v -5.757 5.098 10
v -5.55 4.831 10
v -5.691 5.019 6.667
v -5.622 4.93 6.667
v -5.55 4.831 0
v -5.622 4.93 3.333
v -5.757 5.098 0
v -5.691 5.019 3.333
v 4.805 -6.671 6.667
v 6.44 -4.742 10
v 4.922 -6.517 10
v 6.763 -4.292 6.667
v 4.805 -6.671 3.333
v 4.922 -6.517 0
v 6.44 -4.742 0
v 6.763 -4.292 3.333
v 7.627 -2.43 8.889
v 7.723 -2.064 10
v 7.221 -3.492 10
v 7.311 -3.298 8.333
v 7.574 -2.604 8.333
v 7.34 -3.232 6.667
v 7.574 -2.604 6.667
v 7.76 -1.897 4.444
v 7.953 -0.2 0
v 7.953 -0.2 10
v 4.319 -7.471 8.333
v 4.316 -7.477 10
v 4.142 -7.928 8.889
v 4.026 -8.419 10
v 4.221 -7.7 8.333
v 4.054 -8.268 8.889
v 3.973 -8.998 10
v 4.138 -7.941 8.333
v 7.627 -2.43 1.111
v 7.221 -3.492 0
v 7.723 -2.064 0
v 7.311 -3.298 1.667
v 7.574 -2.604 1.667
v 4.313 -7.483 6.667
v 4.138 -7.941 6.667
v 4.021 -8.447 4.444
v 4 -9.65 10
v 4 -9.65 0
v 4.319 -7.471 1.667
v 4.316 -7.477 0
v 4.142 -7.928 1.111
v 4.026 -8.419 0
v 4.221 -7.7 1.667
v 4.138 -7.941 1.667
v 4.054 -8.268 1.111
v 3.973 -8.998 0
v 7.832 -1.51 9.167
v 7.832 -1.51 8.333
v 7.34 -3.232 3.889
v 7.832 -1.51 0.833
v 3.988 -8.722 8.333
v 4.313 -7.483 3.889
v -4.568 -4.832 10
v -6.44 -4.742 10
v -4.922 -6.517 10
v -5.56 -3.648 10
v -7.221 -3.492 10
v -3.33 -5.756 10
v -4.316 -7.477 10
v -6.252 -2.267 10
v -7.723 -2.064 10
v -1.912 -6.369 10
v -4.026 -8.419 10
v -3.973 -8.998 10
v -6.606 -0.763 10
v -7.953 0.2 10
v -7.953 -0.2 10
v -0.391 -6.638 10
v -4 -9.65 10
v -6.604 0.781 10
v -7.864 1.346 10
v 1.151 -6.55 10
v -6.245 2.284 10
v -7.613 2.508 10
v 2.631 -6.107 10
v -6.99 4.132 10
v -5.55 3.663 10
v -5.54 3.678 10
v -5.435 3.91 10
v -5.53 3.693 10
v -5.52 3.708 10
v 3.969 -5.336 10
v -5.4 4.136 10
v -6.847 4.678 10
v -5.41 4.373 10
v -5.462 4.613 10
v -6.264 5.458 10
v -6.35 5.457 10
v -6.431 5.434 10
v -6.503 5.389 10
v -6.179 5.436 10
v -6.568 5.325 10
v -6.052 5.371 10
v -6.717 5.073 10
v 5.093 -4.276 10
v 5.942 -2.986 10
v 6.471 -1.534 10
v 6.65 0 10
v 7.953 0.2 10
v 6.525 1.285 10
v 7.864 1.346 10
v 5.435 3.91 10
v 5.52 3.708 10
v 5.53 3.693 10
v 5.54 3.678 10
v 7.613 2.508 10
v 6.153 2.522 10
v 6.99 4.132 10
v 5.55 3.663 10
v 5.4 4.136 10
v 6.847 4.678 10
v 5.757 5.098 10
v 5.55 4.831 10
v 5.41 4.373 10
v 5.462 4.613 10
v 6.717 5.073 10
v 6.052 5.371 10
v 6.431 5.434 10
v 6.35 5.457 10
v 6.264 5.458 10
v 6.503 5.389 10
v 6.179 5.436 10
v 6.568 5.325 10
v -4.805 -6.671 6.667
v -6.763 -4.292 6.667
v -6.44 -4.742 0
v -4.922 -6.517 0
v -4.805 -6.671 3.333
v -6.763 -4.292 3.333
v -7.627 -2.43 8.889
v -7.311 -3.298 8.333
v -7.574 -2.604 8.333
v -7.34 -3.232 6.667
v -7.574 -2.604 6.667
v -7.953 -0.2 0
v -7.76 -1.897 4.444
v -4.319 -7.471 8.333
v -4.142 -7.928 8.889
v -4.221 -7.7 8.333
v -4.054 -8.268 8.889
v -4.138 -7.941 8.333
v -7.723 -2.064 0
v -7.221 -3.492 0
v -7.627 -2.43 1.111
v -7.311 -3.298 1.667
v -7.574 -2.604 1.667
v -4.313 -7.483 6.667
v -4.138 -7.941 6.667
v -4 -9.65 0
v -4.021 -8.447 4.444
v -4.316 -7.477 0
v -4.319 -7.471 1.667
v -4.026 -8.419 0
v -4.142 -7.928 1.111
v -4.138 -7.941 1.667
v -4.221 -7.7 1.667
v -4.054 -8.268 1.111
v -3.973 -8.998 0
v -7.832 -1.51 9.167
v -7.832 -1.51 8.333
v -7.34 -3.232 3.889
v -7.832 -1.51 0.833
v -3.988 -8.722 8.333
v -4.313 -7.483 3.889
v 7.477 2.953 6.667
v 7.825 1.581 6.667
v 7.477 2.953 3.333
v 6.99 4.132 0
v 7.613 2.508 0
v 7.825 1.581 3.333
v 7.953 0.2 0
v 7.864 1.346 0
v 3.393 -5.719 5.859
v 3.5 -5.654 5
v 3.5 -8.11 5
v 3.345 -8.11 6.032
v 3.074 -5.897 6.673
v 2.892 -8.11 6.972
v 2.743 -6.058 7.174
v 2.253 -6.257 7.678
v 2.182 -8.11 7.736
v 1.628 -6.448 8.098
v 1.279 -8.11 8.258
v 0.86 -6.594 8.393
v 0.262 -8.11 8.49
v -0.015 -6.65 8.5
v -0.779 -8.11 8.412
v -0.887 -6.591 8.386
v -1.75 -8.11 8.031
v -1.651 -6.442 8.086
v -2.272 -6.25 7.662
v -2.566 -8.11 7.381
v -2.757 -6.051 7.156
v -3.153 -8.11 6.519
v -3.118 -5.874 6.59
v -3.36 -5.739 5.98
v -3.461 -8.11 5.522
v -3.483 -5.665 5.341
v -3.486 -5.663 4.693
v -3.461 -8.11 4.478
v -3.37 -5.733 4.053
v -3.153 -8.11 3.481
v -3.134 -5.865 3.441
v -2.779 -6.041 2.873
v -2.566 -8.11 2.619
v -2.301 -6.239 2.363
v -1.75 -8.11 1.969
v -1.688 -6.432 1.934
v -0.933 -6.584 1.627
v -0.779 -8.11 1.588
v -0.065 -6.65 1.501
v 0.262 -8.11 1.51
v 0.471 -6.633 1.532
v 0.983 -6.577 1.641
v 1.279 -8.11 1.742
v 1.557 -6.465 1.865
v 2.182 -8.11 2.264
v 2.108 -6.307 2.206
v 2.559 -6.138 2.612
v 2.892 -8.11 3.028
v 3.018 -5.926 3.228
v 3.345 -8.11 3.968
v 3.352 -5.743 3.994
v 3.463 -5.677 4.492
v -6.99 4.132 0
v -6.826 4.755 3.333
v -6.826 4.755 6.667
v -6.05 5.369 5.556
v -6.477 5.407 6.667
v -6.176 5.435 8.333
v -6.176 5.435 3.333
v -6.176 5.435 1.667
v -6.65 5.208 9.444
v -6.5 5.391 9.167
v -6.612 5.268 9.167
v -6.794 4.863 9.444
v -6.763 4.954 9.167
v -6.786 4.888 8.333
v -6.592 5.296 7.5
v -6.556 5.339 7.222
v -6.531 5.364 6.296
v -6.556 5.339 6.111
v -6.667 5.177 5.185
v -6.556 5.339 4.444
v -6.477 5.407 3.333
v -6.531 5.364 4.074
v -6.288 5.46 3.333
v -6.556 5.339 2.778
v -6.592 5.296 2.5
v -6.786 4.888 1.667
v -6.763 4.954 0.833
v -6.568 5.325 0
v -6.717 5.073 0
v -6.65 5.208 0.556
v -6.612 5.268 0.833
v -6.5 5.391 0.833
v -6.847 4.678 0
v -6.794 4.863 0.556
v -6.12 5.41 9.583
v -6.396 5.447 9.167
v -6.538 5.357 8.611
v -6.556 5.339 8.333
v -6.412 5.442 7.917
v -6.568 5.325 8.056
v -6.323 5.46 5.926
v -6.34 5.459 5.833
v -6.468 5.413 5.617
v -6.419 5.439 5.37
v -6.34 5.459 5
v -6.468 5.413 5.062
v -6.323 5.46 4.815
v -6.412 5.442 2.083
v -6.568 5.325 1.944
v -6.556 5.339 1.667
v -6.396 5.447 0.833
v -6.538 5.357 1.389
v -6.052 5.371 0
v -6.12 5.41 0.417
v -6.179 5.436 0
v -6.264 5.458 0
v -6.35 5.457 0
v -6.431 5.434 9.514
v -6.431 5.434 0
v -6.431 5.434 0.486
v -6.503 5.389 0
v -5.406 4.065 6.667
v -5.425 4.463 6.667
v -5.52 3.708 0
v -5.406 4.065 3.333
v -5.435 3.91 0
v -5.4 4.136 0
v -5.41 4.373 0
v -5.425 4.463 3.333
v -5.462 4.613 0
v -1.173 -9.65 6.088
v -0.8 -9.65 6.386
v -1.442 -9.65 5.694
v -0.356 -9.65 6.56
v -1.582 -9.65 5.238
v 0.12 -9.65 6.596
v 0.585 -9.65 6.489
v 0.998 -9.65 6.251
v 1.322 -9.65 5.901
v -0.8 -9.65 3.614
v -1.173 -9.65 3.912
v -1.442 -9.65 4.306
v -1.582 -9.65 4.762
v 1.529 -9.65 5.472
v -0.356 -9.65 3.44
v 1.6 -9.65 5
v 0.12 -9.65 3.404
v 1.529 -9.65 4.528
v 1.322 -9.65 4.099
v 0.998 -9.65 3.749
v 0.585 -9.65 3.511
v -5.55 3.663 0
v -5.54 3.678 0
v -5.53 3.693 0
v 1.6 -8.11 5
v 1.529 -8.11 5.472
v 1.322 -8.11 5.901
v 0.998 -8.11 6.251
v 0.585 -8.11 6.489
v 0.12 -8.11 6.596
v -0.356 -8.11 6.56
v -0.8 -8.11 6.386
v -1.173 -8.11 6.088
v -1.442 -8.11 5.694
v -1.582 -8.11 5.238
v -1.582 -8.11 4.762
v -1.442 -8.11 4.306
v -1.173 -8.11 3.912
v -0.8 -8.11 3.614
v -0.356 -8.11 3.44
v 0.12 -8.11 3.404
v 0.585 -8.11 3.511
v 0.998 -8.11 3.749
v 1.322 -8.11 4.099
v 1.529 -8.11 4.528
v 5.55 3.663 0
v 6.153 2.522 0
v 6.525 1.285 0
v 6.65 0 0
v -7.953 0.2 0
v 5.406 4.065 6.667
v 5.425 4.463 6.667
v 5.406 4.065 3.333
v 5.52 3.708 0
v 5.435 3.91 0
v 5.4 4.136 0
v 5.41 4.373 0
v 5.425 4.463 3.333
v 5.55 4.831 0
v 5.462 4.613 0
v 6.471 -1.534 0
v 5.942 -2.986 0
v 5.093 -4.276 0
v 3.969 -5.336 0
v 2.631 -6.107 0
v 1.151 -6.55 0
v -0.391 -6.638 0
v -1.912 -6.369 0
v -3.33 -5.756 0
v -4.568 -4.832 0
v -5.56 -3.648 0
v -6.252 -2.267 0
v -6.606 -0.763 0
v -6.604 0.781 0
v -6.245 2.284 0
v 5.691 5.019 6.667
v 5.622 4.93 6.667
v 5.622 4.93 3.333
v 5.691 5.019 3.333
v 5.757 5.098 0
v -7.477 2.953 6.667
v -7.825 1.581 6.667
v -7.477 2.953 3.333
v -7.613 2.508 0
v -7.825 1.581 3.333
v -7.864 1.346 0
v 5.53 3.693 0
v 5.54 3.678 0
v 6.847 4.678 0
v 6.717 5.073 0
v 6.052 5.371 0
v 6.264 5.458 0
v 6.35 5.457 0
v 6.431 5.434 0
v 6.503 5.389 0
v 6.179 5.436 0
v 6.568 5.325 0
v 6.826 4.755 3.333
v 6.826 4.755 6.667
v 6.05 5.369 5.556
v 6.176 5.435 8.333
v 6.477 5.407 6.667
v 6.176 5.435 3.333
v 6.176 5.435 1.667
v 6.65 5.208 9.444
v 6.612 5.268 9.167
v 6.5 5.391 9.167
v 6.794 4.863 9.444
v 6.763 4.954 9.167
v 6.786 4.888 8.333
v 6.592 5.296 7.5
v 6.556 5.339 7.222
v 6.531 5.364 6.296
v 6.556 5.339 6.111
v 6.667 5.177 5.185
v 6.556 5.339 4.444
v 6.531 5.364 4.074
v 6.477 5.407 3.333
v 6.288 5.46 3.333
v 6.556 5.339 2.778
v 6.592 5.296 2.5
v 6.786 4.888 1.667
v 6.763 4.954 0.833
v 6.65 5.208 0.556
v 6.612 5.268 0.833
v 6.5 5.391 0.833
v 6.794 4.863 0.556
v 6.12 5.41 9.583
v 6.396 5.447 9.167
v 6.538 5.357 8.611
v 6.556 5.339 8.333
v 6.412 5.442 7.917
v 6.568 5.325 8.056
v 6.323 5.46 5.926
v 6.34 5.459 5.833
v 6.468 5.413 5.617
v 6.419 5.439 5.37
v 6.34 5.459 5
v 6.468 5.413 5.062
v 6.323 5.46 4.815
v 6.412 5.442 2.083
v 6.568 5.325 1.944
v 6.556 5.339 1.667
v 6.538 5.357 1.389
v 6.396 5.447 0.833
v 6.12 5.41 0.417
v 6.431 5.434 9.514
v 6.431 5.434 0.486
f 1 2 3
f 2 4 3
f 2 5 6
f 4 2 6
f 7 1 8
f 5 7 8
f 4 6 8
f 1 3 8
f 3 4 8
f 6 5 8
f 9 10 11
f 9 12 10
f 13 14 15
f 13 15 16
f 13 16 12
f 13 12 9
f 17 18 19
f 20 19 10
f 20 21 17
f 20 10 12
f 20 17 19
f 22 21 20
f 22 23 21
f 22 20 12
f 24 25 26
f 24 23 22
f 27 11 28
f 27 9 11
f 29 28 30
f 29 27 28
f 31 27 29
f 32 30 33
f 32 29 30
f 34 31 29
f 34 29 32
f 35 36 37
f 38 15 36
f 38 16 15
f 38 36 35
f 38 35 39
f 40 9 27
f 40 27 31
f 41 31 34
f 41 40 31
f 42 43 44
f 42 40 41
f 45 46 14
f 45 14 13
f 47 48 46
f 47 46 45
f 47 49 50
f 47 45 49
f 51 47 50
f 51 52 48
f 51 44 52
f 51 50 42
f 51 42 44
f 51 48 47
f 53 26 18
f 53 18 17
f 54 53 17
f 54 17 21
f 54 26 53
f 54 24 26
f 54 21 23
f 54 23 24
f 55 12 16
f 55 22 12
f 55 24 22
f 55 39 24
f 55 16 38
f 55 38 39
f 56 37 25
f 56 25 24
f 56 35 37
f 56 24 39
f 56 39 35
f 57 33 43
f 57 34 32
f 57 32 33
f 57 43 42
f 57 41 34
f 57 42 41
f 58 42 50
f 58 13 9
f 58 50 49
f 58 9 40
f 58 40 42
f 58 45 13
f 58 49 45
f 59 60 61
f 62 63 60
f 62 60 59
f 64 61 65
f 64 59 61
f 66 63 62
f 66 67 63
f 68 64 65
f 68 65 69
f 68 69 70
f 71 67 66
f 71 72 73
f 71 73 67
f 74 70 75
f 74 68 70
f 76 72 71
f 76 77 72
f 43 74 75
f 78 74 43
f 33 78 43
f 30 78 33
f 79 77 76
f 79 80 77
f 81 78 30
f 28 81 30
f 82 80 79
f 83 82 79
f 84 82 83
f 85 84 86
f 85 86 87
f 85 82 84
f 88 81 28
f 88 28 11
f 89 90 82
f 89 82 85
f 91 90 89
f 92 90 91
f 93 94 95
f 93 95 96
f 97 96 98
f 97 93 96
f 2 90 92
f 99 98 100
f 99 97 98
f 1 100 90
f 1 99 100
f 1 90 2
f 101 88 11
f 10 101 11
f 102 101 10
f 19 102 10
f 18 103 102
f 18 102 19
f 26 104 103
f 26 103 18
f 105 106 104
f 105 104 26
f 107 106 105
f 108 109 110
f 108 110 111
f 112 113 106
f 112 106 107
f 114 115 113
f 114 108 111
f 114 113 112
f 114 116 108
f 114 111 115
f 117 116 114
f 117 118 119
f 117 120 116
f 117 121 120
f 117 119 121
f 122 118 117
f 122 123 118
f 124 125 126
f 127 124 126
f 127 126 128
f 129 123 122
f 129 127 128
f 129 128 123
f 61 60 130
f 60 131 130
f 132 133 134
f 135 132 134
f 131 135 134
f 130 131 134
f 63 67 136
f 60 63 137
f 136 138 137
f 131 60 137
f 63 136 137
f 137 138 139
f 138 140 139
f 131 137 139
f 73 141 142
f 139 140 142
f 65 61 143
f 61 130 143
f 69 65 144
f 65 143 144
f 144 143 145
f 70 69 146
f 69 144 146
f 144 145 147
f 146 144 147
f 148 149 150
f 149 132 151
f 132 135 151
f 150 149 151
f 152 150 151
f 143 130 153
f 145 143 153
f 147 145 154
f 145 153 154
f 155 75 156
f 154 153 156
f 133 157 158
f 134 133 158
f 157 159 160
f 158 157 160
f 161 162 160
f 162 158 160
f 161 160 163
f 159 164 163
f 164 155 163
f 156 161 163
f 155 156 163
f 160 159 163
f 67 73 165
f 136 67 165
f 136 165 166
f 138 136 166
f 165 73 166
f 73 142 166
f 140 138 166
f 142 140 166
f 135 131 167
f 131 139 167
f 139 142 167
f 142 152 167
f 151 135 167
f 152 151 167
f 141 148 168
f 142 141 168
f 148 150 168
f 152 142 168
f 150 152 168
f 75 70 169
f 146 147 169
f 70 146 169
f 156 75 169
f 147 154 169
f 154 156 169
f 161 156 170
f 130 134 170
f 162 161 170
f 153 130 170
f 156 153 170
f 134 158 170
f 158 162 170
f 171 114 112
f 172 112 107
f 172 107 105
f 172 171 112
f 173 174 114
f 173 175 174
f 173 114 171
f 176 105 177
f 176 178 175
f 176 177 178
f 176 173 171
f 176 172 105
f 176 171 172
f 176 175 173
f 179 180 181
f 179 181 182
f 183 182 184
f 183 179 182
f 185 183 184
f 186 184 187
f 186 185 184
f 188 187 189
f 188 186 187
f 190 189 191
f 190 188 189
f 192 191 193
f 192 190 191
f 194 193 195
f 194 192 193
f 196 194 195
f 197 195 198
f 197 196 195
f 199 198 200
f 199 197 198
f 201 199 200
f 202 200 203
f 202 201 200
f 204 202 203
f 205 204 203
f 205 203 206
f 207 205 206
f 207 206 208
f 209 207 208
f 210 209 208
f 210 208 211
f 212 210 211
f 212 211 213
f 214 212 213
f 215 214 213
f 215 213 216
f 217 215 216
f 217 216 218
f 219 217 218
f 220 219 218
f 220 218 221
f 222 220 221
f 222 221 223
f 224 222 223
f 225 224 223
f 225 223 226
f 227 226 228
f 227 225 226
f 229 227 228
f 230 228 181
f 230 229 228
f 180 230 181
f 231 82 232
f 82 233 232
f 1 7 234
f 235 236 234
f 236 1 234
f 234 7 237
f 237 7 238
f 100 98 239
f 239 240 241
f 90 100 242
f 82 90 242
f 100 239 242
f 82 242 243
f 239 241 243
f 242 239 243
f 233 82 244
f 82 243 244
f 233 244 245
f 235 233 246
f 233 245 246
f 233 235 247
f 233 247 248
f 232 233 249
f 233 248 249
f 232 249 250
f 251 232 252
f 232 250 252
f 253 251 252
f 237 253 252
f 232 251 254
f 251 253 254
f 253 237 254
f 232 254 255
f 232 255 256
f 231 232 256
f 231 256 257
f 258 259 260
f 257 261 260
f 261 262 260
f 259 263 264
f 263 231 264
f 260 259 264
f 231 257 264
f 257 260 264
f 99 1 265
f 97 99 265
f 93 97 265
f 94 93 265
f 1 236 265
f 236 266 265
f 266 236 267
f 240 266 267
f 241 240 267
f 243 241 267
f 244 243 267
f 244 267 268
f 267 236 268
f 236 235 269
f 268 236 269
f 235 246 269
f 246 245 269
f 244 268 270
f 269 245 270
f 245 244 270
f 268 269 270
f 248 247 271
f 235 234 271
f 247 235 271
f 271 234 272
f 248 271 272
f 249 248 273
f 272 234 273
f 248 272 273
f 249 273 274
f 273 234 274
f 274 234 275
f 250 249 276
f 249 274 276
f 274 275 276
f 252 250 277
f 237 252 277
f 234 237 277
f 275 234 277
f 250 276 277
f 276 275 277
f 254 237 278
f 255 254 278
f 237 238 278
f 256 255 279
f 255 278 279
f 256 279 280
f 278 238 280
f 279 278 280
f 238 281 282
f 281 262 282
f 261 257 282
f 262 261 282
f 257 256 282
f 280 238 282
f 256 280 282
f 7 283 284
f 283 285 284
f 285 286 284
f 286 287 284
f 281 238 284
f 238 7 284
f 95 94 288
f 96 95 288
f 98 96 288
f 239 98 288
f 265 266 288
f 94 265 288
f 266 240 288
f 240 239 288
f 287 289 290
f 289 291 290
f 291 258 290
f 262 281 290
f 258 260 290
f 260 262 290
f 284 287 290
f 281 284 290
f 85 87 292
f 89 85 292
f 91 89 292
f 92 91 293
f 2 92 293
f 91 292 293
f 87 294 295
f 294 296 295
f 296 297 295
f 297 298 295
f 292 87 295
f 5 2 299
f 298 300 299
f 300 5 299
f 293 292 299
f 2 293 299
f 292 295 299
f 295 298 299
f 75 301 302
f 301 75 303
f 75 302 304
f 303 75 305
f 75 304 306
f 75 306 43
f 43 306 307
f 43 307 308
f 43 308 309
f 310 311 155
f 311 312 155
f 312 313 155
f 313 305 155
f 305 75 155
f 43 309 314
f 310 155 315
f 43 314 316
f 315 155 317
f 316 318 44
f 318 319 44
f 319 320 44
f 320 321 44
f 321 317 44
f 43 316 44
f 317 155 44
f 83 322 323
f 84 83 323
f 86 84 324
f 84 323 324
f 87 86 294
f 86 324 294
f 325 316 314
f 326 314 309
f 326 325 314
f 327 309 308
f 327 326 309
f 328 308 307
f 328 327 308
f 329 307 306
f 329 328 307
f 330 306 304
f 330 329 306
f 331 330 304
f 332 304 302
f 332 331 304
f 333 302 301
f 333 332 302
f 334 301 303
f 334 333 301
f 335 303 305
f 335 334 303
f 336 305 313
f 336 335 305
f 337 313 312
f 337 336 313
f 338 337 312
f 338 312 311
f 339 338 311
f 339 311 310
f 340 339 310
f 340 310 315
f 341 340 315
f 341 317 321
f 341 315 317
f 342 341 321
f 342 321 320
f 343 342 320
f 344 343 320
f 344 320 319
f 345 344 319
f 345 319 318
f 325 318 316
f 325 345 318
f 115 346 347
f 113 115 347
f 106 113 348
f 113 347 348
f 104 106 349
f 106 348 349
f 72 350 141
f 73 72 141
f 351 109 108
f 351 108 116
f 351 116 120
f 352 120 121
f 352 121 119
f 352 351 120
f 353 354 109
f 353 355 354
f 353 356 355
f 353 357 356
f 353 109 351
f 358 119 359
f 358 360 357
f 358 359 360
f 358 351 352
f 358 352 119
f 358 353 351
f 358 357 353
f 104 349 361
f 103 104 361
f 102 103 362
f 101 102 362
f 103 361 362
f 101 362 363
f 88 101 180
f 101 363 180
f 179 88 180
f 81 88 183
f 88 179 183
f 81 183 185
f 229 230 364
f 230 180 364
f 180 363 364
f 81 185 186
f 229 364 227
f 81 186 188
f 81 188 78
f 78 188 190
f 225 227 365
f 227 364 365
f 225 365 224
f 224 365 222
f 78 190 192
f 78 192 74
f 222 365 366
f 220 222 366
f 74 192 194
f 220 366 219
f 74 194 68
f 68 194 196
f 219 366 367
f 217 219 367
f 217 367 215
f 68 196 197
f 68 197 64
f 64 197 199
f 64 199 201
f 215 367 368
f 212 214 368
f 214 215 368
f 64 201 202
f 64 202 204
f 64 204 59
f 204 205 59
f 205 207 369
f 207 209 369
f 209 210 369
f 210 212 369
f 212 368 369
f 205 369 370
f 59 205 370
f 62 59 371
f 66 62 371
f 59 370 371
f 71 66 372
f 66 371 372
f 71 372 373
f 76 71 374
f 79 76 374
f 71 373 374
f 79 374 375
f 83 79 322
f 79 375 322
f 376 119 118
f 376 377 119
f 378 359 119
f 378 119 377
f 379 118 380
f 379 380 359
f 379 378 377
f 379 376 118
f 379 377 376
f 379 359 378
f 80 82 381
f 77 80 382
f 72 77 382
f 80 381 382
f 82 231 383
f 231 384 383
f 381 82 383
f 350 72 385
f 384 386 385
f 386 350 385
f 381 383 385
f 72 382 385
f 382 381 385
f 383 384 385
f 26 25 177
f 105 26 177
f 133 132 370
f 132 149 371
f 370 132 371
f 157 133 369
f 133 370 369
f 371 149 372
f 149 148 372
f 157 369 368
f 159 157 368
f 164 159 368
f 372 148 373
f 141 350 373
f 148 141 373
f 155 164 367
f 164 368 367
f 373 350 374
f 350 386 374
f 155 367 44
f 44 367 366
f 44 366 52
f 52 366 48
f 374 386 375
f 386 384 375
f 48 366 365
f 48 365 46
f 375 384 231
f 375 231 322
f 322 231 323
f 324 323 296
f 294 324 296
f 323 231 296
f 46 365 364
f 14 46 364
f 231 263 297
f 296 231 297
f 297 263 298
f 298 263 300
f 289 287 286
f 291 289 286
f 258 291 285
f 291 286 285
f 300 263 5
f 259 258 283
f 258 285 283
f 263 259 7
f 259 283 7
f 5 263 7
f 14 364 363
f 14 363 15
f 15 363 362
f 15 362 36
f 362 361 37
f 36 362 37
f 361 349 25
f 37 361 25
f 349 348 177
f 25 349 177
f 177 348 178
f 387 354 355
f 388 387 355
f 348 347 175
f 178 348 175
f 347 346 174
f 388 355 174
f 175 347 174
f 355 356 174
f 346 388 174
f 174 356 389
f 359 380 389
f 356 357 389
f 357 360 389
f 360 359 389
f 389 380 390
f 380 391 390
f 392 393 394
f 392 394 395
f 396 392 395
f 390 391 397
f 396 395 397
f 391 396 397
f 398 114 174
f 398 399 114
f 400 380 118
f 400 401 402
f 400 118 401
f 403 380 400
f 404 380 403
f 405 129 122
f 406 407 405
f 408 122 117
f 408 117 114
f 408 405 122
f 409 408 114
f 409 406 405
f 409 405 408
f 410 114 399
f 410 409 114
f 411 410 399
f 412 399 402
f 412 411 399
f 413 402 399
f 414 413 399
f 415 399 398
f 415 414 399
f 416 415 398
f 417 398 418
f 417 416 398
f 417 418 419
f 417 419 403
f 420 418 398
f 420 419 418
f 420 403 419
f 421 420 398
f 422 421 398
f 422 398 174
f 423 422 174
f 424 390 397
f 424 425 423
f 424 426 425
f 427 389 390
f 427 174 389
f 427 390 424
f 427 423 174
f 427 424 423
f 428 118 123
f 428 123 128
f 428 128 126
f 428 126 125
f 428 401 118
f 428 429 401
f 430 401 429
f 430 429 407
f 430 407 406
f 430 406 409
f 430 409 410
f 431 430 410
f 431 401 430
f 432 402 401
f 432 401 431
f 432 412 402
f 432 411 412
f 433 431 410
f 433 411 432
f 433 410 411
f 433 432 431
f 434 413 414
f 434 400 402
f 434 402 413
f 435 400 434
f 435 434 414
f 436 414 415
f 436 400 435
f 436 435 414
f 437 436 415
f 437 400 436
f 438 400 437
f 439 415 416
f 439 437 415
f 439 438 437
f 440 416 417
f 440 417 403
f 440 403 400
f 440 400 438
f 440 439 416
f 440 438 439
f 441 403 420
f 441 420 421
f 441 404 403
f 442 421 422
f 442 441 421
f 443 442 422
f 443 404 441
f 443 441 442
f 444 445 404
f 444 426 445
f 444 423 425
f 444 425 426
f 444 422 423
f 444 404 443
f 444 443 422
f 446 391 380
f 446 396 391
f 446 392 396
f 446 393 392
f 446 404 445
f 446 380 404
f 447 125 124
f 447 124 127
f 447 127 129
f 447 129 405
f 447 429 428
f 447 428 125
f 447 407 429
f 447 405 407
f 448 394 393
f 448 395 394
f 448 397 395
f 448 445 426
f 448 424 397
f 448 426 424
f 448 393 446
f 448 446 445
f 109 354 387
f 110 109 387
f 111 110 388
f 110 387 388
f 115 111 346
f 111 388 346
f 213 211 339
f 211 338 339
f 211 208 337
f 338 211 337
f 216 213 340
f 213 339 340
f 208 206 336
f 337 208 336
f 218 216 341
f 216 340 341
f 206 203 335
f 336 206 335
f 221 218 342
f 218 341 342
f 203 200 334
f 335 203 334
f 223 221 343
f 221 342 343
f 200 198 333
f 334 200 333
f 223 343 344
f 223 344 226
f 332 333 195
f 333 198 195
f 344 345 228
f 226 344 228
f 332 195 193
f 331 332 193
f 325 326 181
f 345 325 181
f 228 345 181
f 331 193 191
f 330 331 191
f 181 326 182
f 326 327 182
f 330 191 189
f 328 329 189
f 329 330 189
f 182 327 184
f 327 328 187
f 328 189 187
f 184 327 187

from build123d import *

# Parameters (mm, degrees)
F1_DEPTH = 10
F2_R     = 1.6
F3_DEPTH = 23.7
F2_R_2   = 3.5
F4_DEPTH = 8.11


with BuildPart() as f1:
    # F0 (on Top) → F1 (new body)
    with BuildSketch(Plane.XY):
        with BuildLine():
            ThreePointArc((5.55, 3.6633318168), (6.3690658656, 1.9124591499), (6.65, 0))
            ThreePointArc((6.65, 0), (-1.9124591499, -6.3690658656), (-5.55, 3.6633318168))
            ThreePointArc((-5.55, 3.6633318168), (-5.5352837539, 3.6855303232), (-5.5204787204, 3.7076697127))
            add(Edge.make_bspline(
                [(-5.5204787204, 3.7076697127), (-5.3297892382, 4.0203295099), (-5.3804192174, 4.5028316873), (-5.55, 4.8312691983)],
                knots=[0.0105120097, 0.0105120097, 0.0105120097, 0.0105120097, 0.2268448642, 0.2268448642, 0.2268448642, 0.2268448642], degree=3))
            add(Edge.make_bspline(
                [(-5.55, 4.8312691983), (-5.6230599396, 4.9344742738), (-5.6920586566, 5.0230662013), (-5.7572539606, 5.0984029712)],
                knots=[0, 0, 0, 0, 0.1009309198, 0.1009309198, 0.1009309198, 0.1009309198], degree=3))
            add(Edge.make_bspline(
                [(-5.7572539606, 5.0984029712), (-5.8127692495, 5.1426175603), (-6.1763134647, 5.3226921748), (-6.6399504917, 4.8081685915), (-6.9900612717, 4.1319315673)],
                knots=[0.2997379692, 0.2997379692, 0.2997379692, 0.2997379692, 0.350659585, 0.6091967522, 0.6091967522, 0.6091967522, 0.6091967522], degree=3))
            add(Edge.make_bspline(
                [(-6.9900612717, 4.1319315673), (-7.5192866492, 3.1097356941), (-7.9634342646, 1.5245852987), (-7.952605829, 0.2)],
                knots=[0.6091967522, 0.6091967522, 0.6091967522, 0.6091967522, 1, 1, 1, 1], degree=3))
            Line((-7.952605829, 0.2), (-7.952605829, 0))
            Line((-7.952605829, 0), (-7.952605829, -0.2))
            add(Edge.make_bspline(
                [(-7.952605829, -0.2), (-7.7880043421, -5.9189782478), (-3.58719808, -5.5995097942), (-4, -9.65)],
                knots=[0, 0, 0, 0, 10.2433194248, 10.2433194248, 10.2433194248, 10.2433194248], degree=3))
            Line((-4, -9.65), (0, -9.65))
            Line((0, -9.65), (4, -9.65))
            add(Edge.make_bspline(
                [(7.952605829, -0.2), (7.7880043421, -5.9189782478), (3.58719808, -5.5995097942), (4, -9.65)],
                knots=[0, 0, 0, 0, 10.2433194248, 10.2433194248, 10.2433194248, 10.2433194248], degree=3))
            Line((7.952605829, -0.2), (7.952605829, 0))
            Line((7.952605829, 0), (7.952605829, 0.2))
            add(Edge.make_bspline(
                [(6.9900612717, 4.1319315673), (7.5192866492, 3.1097356941), (7.9634342646, 1.5245852987), (7.952605829, 0.2)],
                knots=[0.6091967522, 0.6091967522, 0.6091967522, 0.6091967522, 1, 1, 1, 1], degree=3))
            add(Edge.make_bspline(
                [(5.7572539606, 5.0984029712), (5.8127692495, 5.1426175603), (6.1763134647, 5.3226921748), (6.6399504917, 4.8081685915), (6.9900612717, 4.1319315673)],
                knots=[0.2997379692, 0.2997379692, 0.2997379692, 0.2997379692, 0.350659585, 0.6091967522, 0.6091967522, 0.6091967522, 0.6091967522], degree=3))
            add(Edge.make_bspline(
                [(5.55, 4.8312691983), (5.6230599396, 4.9344742738), (5.6920586566, 5.0230662013), (5.7572539606, 5.0984029712)],
                knots=[0, 0, 0, 0, 0.1009309198, 0.1009309198, 0.1009309198, 0.1009309198], degree=3))
            add(Edge.make_bspline(
                [(5.5204787204, 3.7076697127), (5.3297892382, 4.0203295099), (5.3804192174, 4.5028316873), (5.55, 4.8312691983)],
                knots=[0.0105120097, 0.0105120097, 0.0105120097, 0.0105120097, 0.2268448642, 0.2268448642, 0.2268448642, 0.2268448642], degree=3))
            ThreePointArc((5.5204787204, 3.7076697127), (5.5352837539, 3.6855303232), (5.55, 3.6633318168))
        make_face()
        with BuildLine():
            add(Edge.make_bspline(
                [(5.7572539606, 5.0984029712), (6.726137476, 6.2180013153), (6.8550118896, 4.4101097728), (6.9900612717, 4.1319315673)],
                knots=[0.1009309198, 0.1009309198, 0.1009309198, 0.1009309198, 1.6008902487, 1.6008902487, 1.6008902487, 1.6008902487], degree=3))
            add(Edge.make_bspline(
                [(5.7572539606, 5.0984029712), (5.8127692495, 5.1426175603), (6.1763134647, 5.3226921748), (6.6399504917, 4.8081685915), (6.9900612717, 4.1319315673)],
                knots=[0.2997379692, 0.2997379692, 0.2997379692, 0.2997379692, 0.350659585, 0.6091967522, 0.6091967522, 0.6091967522, 0.6091967522], degree=3))
        make_face()
        with BuildLine():
            add(Edge.make_bspline(
                [(-5.7572539606, 5.0984029712), (-5.8127692495, 5.1426175603), (-6.1763134647, 5.3226921748), (-6.6399504917, 4.8081685915), (-6.9900612717, 4.1319315673)],
                knots=[0.2997379692, 0.2997379692, 0.2997379692, 0.2997379692, 0.350659585, 0.6091967522, 0.6091967522, 0.6091967522, 0.6091967522], degree=3))
            add(Edge.make_bspline(
                [(-5.7572539606, 5.0984029712), (-6.726137476, 6.2180013153), (-6.8550118896, 4.4101097728), (-6.9900612717, 4.1319315673)],
                knots=[0.1009309198, 0.1009309198, 0.1009309198, 0.1009309198, 1.6008902487, 1.6008902487, 1.6008902487, 1.6008902487], degree=3))
        make_face()
    extrude(amount=F1_DEPTH)

    # F2 (on Front) → F3 (cut)
    with BuildSketch(Plane.XZ):
        with Locations((0, 5)):
            Circle(F2_R)
    extrude(amount=F3_DEPTH, mode=Mode.SUBTRACT)

    # F2 (on Front) → F4 (cut)
    with BuildSketch(Plane.XZ):
        with Locations((0, 5)):
            Circle(F2_R_2)
        with Locations((0, 5)):
            Circle(F2_R, mode=Mode.SUBTRACT)
    extrude(amount=F4_DEPTH, mode=Mode.SUBTRACT)


solid = f1.part
